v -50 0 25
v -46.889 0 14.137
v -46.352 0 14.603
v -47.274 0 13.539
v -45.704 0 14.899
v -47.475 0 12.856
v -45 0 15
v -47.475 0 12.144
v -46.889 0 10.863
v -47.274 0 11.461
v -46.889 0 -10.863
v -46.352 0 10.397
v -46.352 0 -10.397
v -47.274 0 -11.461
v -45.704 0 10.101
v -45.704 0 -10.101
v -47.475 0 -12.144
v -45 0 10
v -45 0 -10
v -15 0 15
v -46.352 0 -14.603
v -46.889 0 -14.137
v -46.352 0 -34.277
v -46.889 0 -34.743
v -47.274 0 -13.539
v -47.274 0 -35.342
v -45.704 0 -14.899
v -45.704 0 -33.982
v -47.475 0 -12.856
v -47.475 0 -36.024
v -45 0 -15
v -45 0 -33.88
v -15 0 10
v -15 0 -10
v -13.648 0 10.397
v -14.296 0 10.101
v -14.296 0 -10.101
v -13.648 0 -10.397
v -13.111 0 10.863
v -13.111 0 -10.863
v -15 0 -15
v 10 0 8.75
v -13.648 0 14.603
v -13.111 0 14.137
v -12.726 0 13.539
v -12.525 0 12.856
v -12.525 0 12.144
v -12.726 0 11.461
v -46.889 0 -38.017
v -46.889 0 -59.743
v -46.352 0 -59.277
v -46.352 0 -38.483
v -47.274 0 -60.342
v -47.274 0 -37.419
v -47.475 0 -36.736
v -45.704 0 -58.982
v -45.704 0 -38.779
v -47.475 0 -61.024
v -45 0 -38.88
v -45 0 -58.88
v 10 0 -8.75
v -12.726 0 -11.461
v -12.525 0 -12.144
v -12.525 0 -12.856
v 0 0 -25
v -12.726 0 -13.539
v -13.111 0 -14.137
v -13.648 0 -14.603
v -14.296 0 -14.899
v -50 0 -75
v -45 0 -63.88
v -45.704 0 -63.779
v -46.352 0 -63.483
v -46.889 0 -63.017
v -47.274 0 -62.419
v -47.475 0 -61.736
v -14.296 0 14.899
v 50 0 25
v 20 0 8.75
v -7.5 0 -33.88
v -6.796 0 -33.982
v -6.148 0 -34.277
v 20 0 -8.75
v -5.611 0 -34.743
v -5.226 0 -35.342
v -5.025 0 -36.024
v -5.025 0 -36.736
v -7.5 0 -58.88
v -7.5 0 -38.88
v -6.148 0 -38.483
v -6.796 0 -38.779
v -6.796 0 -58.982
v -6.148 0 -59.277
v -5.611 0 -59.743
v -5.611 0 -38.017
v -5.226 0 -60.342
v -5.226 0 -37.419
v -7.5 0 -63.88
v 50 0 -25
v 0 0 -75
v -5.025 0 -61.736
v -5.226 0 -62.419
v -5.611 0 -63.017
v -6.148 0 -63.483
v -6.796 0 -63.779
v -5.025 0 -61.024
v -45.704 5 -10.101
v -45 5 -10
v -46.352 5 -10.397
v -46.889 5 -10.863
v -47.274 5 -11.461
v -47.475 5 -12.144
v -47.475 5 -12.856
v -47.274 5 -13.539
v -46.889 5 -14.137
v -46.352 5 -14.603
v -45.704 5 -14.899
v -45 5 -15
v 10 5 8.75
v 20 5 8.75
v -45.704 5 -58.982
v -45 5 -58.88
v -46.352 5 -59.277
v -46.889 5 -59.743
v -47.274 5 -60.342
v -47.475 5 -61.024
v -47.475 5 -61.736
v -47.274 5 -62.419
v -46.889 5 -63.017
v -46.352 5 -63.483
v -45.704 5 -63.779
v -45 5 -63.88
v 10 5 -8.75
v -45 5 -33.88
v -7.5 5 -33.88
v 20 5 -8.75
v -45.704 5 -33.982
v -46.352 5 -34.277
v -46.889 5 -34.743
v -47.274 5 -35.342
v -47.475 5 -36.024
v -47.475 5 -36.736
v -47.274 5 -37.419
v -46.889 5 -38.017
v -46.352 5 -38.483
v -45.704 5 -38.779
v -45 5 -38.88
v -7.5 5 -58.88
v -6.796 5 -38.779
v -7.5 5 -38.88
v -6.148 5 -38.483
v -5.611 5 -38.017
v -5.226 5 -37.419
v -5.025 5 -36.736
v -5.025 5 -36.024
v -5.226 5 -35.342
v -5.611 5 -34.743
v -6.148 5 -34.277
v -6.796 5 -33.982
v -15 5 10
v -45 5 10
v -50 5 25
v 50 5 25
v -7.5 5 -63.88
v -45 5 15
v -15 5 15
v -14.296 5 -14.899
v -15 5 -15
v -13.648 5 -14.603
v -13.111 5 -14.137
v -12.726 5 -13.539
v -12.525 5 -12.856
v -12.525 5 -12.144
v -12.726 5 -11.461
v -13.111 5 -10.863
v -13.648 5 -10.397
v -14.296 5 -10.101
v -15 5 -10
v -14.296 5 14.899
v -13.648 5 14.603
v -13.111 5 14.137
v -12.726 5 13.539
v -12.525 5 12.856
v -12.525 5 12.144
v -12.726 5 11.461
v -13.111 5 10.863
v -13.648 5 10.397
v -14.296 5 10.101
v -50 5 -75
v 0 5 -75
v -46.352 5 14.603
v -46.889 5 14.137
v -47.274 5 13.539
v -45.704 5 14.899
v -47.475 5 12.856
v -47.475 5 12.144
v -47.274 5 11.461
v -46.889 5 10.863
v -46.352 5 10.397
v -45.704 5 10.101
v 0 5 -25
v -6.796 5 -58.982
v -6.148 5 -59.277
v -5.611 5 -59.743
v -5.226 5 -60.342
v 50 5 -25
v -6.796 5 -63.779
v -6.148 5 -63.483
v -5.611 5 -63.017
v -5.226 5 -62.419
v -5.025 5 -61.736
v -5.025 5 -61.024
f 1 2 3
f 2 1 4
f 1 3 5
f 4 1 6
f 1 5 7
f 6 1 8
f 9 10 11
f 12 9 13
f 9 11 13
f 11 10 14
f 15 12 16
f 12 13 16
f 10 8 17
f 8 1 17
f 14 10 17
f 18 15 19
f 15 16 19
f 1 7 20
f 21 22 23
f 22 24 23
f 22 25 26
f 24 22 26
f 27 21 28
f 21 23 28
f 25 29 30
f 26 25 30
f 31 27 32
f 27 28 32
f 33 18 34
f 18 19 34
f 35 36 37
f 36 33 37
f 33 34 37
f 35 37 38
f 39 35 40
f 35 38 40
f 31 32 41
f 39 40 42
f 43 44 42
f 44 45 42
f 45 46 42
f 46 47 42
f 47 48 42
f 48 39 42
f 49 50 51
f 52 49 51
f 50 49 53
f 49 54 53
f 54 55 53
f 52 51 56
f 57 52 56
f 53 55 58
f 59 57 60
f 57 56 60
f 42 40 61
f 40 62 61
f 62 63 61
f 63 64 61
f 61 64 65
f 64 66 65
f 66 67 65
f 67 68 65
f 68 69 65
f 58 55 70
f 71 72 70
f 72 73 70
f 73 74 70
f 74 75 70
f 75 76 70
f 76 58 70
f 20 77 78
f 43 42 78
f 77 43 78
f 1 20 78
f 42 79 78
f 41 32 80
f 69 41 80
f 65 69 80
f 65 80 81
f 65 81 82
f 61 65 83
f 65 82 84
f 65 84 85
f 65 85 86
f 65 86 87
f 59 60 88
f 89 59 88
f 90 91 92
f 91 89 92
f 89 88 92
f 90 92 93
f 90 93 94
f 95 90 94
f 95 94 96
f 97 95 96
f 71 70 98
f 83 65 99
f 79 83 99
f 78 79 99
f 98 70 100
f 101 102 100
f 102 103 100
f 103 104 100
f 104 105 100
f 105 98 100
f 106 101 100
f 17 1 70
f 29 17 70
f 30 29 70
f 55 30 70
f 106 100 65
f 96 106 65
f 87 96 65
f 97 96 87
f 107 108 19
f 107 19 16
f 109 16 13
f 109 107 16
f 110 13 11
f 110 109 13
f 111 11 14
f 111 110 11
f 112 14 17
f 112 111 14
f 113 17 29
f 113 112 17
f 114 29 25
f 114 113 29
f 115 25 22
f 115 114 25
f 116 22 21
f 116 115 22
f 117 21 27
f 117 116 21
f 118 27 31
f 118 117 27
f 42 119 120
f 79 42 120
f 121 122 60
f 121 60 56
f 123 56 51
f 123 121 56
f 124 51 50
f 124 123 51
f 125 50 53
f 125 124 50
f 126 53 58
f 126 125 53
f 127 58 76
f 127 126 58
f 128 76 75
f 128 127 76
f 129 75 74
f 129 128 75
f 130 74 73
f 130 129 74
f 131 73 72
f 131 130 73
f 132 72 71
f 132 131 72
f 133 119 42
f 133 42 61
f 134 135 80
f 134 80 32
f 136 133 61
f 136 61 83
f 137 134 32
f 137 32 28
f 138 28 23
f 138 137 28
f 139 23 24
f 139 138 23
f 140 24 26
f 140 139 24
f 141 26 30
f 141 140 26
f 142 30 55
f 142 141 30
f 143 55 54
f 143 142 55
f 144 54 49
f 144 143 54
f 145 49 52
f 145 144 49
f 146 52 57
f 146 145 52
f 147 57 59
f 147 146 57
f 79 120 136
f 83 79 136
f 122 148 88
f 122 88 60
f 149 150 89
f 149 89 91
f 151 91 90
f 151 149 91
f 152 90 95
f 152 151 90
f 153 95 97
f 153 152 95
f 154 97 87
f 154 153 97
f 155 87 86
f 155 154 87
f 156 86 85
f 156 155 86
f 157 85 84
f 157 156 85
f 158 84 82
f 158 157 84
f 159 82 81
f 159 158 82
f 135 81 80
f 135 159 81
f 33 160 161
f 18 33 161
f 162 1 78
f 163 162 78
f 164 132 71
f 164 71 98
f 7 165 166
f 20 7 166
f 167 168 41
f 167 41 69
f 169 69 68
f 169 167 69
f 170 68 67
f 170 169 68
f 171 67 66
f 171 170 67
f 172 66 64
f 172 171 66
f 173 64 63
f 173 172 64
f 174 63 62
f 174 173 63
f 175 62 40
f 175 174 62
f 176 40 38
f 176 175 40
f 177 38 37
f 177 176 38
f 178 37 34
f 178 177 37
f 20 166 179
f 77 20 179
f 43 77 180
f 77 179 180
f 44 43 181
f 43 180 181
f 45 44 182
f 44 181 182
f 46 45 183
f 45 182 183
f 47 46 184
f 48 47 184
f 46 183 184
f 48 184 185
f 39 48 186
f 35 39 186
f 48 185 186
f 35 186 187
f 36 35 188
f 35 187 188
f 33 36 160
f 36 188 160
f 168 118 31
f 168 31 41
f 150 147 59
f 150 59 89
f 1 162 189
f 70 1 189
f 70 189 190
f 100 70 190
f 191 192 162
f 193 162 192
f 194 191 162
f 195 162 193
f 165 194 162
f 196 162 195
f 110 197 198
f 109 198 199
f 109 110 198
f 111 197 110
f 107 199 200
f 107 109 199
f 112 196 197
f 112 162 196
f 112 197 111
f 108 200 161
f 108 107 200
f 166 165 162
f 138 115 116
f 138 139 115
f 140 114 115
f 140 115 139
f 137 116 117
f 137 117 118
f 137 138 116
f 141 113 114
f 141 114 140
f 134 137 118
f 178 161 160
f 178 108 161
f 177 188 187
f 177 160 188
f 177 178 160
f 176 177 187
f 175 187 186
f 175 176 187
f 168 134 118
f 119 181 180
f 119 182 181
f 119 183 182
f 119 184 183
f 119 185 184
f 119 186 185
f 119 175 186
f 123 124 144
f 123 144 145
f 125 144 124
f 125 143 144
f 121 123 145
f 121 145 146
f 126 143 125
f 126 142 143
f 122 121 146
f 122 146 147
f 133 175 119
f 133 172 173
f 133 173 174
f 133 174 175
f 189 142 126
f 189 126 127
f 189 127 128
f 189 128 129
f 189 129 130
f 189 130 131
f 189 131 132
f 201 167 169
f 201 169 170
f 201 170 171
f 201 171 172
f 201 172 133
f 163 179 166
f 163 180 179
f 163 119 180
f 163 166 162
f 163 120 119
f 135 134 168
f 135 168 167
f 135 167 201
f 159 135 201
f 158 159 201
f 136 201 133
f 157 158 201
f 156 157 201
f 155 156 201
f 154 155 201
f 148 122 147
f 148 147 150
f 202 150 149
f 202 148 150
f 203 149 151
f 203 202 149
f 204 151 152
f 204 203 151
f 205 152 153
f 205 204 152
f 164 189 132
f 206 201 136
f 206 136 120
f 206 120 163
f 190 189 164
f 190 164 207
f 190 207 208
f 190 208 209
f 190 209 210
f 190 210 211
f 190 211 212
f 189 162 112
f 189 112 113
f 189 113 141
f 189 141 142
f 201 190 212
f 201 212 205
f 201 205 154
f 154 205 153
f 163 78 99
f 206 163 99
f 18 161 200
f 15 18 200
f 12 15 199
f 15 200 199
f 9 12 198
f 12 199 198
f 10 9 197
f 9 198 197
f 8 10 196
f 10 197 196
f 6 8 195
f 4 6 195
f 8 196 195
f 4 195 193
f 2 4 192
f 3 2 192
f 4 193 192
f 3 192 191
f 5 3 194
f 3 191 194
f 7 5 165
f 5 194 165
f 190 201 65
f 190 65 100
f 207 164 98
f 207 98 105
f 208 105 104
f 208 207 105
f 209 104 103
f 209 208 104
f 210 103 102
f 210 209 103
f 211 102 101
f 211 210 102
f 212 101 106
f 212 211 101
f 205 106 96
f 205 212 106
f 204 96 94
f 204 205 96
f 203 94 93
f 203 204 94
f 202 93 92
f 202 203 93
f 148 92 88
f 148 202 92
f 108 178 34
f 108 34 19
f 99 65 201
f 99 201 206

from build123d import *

# Parameters (mm, degrees)
SKETCH2_W           = 100
SKETCH2_H           = 50
BOSS_EXTRUDE1_DEPTH = 5
SKETCH3_W           = 10
SKETCH3_H           = 17.5
CUT_EXTRUDE1_DEPTH  = 7.5
CUT_EXTRUDE2_DEPTH  = 7.5
SKETCH5_W           = 50
SKETCH5_H           = 50
BOSS_EXTRUDE2_DEPTH = 5
CUT_EXTRUDE3_DEPTH  = 10
LPATTERN1_COUNT     = 2
LPATTERN1_PITCH     = 25


with BuildPart() as part:
    # Sketch2 → Boss-Extrude1 (new body)
    with BuildSketch(Plane(origin=(0, 0, 0), x_dir=(1, 0, 0), z_dir=(0, 1, 0))):
        Rectangle(SKETCH2_W, SKETCH2_H)
    extrude(amount=BOSS_EXTRUDE1_DEPTH)

    # Sketch3 → Cut-Extrude1 (cut)
    with BuildSketch(Plane(origin=(0, 5, 0), x_dir=(1, 0, 0), z_dir=(0, 1, 0))):
        with Locations((15, 0)):
            Rectangle(SKETCH3_W, SKETCH3_H)
    extrude(amount=-CUT_EXTRUDE1_DEPTH, mode=Mode.SUBTRACT)

    # Sketch4 → Cut-Extrude2 (cut)
    with BuildSketch(Plane(origin=(0, 5, 0), x_dir=(1, 0, 0), z_dir=(0, 1, 0))):
        with BuildLine():
            Line((-45, 15), (-15, 15))
            ThreePointArc((-15, 15), (-12.5, 12.5), (-15, 10))
            Line((-15, 10), (-45, 10))
            ThreePointArc((-45, 10), (-47.5, 12.5), (-45, 15))
        make_face()
        with BuildLine():
            Line((-45, -15), (-15, -15))
            ThreePointArc((-15, -15), (-12.5, -12.5), (-15, -10))
            Line((-15, -10), (-45, -10))
            ThreePointArc((-45, -10), (-47.5, -12.5), (-45, -15))
        make_face()
    extrude(amount=-CUT_EXTRUDE2_DEPTH, mode=Mode.SUBTRACT)

    # Sketch5 → Boss-Extrude2 (add)
    with BuildSketch(Plane(origin=(0, 5, 0), x_dir=(1, 0, 0), z_dir=(0, 1, 0))):
        with Locations((-25, 50)):
            Rectangle(SKETCH5_W, SKETCH5_H)
    extrude(amount=-BOSS_EXTRUDE2_DEPTH)

    # Sketch6 → Cut-Extrude3 (cut)
    with BuildSketch(Plane(origin=(0, 5, 0), x_dir=(1, 0, 0), z_dir=(0, 1, 0))):
        with BuildLine():
            Line((-45, 38.880259694), (-7.5, 38.880259694))
            ThreePointArc((-7.5, 38.880259694), (-5, 36.380259694), (-7.5, 33.880259694))
            Line((-7.5, 33.880259694), (-45, 33.880259694))
            ThreePointArc((-45, 33.880259694), (-47.5, 36.380259694), (-45, 38.880259694))
        make_face()
    cut_extrude3 = extrude(amount=-CUT_EXTRUDE3_DEPTH, mode=Mode.SUBTRACT)

    # LPattern1: Cut-Extrude3 ×2
    with Locations(*[(0, 0, -i * LPATTERN1_PITCH) for i in range(1, LPATTERN1_COUNT)]):
        add(cut_extrude3, mode=Mode.SUBTRACT)


solid = part.part
